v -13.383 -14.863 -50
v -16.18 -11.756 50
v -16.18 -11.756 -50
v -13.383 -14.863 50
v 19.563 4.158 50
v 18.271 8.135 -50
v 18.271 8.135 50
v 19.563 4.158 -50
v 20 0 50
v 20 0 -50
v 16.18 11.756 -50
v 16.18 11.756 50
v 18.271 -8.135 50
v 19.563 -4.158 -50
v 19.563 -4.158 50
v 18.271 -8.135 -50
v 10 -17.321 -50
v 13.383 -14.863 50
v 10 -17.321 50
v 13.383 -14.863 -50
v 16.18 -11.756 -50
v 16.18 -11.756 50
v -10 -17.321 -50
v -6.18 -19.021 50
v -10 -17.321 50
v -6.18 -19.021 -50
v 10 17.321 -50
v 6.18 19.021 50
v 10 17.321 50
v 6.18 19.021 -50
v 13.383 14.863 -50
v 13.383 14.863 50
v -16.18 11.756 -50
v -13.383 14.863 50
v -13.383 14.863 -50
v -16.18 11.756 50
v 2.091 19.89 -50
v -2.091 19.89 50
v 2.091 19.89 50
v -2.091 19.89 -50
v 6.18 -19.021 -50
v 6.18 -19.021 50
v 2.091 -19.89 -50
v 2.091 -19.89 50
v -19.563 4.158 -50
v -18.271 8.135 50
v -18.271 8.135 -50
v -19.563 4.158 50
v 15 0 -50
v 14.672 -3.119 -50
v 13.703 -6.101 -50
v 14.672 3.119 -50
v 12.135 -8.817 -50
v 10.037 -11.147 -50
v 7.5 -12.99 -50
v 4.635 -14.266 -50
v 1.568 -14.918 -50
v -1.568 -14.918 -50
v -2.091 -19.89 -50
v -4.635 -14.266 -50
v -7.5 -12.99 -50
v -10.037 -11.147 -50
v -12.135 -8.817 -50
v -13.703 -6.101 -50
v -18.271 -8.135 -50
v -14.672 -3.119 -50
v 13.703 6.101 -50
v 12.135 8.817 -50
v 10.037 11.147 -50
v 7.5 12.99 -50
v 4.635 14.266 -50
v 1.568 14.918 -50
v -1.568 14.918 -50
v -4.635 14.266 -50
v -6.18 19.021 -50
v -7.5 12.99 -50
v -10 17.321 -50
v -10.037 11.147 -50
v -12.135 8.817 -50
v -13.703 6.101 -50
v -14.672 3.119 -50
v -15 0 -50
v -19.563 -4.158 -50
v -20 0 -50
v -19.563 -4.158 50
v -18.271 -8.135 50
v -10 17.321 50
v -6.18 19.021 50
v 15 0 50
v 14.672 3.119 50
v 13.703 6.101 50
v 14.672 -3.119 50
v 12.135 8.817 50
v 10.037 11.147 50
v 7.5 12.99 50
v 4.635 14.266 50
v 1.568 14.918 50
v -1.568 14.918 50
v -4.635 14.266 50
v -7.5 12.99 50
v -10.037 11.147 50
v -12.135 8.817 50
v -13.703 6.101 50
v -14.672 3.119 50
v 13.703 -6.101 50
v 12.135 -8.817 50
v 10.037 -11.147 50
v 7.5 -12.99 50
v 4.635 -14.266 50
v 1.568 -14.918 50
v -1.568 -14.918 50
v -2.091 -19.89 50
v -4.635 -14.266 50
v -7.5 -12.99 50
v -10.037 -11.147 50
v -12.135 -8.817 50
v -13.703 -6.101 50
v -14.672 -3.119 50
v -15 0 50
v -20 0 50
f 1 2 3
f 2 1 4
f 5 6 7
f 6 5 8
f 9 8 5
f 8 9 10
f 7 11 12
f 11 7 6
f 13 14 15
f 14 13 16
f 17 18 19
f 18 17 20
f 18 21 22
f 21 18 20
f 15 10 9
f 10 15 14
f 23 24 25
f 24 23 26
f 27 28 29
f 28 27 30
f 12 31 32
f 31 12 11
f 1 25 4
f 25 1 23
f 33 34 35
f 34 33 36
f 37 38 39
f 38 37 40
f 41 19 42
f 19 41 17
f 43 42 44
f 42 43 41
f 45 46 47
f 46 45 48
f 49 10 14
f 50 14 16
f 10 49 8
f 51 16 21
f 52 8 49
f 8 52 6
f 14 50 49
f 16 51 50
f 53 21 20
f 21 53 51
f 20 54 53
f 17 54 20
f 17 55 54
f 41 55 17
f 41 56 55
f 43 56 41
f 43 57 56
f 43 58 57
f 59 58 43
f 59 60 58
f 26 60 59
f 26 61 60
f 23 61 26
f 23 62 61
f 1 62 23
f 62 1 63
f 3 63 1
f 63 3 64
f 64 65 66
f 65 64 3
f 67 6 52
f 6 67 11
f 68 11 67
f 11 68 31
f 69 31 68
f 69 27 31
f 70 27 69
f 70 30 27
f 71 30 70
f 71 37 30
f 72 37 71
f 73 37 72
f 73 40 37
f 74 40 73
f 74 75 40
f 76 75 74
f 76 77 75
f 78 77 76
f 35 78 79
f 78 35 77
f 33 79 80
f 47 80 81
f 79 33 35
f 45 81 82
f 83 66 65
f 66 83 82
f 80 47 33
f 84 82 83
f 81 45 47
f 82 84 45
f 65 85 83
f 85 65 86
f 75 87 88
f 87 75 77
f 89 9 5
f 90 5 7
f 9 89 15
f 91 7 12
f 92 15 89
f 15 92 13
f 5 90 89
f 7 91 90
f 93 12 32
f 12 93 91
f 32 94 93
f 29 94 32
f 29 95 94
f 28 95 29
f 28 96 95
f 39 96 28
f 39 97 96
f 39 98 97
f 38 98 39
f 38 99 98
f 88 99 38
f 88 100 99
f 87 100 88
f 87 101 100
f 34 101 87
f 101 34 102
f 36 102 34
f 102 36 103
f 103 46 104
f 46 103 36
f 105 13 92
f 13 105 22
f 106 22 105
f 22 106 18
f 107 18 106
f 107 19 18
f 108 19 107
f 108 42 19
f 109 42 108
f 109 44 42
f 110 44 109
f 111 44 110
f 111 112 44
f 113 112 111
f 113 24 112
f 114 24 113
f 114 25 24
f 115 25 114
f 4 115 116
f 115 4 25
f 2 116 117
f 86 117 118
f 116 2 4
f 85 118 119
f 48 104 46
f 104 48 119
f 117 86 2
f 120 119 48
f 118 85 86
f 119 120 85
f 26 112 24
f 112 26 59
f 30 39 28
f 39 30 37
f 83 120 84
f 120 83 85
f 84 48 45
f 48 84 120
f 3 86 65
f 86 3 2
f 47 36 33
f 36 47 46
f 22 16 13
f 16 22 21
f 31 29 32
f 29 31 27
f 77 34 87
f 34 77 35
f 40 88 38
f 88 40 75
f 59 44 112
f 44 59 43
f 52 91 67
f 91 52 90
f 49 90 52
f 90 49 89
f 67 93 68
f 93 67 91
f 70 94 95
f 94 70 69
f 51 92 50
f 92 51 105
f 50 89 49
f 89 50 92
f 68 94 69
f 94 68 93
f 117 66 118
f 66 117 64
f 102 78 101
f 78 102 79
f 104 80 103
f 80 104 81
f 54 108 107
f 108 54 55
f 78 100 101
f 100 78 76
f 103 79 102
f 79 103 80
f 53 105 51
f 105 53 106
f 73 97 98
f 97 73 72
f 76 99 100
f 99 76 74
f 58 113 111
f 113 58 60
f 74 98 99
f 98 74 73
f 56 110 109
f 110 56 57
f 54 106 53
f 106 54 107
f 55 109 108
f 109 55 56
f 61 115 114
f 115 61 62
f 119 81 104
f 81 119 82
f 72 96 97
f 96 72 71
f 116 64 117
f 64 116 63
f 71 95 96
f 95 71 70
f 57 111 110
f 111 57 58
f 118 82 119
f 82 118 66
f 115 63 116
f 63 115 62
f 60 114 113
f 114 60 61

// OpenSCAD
// file: lib.scad
// See http://en.wikibooks.org/wiki/OpenSCAD_User_Manual/Include_Statement

module pipe(r1, r2, h) {
    difference() {
        cylinder(r=r1, h=h, center=true);
        cylinder(r=r2, h=h+1, center=true);
    }
}

// Following commands are called with "include" but not with "use"

echo("Printed with include but not with use");

pipe(4, 2, 100);
// main file
// See http://en.wikibooks.org/wiki/OpenSCAD_User_Manual/Include_Statement

// preview: F5
// compile and render: F6

use <lib.scad>

pipe(20, 15, 100);
